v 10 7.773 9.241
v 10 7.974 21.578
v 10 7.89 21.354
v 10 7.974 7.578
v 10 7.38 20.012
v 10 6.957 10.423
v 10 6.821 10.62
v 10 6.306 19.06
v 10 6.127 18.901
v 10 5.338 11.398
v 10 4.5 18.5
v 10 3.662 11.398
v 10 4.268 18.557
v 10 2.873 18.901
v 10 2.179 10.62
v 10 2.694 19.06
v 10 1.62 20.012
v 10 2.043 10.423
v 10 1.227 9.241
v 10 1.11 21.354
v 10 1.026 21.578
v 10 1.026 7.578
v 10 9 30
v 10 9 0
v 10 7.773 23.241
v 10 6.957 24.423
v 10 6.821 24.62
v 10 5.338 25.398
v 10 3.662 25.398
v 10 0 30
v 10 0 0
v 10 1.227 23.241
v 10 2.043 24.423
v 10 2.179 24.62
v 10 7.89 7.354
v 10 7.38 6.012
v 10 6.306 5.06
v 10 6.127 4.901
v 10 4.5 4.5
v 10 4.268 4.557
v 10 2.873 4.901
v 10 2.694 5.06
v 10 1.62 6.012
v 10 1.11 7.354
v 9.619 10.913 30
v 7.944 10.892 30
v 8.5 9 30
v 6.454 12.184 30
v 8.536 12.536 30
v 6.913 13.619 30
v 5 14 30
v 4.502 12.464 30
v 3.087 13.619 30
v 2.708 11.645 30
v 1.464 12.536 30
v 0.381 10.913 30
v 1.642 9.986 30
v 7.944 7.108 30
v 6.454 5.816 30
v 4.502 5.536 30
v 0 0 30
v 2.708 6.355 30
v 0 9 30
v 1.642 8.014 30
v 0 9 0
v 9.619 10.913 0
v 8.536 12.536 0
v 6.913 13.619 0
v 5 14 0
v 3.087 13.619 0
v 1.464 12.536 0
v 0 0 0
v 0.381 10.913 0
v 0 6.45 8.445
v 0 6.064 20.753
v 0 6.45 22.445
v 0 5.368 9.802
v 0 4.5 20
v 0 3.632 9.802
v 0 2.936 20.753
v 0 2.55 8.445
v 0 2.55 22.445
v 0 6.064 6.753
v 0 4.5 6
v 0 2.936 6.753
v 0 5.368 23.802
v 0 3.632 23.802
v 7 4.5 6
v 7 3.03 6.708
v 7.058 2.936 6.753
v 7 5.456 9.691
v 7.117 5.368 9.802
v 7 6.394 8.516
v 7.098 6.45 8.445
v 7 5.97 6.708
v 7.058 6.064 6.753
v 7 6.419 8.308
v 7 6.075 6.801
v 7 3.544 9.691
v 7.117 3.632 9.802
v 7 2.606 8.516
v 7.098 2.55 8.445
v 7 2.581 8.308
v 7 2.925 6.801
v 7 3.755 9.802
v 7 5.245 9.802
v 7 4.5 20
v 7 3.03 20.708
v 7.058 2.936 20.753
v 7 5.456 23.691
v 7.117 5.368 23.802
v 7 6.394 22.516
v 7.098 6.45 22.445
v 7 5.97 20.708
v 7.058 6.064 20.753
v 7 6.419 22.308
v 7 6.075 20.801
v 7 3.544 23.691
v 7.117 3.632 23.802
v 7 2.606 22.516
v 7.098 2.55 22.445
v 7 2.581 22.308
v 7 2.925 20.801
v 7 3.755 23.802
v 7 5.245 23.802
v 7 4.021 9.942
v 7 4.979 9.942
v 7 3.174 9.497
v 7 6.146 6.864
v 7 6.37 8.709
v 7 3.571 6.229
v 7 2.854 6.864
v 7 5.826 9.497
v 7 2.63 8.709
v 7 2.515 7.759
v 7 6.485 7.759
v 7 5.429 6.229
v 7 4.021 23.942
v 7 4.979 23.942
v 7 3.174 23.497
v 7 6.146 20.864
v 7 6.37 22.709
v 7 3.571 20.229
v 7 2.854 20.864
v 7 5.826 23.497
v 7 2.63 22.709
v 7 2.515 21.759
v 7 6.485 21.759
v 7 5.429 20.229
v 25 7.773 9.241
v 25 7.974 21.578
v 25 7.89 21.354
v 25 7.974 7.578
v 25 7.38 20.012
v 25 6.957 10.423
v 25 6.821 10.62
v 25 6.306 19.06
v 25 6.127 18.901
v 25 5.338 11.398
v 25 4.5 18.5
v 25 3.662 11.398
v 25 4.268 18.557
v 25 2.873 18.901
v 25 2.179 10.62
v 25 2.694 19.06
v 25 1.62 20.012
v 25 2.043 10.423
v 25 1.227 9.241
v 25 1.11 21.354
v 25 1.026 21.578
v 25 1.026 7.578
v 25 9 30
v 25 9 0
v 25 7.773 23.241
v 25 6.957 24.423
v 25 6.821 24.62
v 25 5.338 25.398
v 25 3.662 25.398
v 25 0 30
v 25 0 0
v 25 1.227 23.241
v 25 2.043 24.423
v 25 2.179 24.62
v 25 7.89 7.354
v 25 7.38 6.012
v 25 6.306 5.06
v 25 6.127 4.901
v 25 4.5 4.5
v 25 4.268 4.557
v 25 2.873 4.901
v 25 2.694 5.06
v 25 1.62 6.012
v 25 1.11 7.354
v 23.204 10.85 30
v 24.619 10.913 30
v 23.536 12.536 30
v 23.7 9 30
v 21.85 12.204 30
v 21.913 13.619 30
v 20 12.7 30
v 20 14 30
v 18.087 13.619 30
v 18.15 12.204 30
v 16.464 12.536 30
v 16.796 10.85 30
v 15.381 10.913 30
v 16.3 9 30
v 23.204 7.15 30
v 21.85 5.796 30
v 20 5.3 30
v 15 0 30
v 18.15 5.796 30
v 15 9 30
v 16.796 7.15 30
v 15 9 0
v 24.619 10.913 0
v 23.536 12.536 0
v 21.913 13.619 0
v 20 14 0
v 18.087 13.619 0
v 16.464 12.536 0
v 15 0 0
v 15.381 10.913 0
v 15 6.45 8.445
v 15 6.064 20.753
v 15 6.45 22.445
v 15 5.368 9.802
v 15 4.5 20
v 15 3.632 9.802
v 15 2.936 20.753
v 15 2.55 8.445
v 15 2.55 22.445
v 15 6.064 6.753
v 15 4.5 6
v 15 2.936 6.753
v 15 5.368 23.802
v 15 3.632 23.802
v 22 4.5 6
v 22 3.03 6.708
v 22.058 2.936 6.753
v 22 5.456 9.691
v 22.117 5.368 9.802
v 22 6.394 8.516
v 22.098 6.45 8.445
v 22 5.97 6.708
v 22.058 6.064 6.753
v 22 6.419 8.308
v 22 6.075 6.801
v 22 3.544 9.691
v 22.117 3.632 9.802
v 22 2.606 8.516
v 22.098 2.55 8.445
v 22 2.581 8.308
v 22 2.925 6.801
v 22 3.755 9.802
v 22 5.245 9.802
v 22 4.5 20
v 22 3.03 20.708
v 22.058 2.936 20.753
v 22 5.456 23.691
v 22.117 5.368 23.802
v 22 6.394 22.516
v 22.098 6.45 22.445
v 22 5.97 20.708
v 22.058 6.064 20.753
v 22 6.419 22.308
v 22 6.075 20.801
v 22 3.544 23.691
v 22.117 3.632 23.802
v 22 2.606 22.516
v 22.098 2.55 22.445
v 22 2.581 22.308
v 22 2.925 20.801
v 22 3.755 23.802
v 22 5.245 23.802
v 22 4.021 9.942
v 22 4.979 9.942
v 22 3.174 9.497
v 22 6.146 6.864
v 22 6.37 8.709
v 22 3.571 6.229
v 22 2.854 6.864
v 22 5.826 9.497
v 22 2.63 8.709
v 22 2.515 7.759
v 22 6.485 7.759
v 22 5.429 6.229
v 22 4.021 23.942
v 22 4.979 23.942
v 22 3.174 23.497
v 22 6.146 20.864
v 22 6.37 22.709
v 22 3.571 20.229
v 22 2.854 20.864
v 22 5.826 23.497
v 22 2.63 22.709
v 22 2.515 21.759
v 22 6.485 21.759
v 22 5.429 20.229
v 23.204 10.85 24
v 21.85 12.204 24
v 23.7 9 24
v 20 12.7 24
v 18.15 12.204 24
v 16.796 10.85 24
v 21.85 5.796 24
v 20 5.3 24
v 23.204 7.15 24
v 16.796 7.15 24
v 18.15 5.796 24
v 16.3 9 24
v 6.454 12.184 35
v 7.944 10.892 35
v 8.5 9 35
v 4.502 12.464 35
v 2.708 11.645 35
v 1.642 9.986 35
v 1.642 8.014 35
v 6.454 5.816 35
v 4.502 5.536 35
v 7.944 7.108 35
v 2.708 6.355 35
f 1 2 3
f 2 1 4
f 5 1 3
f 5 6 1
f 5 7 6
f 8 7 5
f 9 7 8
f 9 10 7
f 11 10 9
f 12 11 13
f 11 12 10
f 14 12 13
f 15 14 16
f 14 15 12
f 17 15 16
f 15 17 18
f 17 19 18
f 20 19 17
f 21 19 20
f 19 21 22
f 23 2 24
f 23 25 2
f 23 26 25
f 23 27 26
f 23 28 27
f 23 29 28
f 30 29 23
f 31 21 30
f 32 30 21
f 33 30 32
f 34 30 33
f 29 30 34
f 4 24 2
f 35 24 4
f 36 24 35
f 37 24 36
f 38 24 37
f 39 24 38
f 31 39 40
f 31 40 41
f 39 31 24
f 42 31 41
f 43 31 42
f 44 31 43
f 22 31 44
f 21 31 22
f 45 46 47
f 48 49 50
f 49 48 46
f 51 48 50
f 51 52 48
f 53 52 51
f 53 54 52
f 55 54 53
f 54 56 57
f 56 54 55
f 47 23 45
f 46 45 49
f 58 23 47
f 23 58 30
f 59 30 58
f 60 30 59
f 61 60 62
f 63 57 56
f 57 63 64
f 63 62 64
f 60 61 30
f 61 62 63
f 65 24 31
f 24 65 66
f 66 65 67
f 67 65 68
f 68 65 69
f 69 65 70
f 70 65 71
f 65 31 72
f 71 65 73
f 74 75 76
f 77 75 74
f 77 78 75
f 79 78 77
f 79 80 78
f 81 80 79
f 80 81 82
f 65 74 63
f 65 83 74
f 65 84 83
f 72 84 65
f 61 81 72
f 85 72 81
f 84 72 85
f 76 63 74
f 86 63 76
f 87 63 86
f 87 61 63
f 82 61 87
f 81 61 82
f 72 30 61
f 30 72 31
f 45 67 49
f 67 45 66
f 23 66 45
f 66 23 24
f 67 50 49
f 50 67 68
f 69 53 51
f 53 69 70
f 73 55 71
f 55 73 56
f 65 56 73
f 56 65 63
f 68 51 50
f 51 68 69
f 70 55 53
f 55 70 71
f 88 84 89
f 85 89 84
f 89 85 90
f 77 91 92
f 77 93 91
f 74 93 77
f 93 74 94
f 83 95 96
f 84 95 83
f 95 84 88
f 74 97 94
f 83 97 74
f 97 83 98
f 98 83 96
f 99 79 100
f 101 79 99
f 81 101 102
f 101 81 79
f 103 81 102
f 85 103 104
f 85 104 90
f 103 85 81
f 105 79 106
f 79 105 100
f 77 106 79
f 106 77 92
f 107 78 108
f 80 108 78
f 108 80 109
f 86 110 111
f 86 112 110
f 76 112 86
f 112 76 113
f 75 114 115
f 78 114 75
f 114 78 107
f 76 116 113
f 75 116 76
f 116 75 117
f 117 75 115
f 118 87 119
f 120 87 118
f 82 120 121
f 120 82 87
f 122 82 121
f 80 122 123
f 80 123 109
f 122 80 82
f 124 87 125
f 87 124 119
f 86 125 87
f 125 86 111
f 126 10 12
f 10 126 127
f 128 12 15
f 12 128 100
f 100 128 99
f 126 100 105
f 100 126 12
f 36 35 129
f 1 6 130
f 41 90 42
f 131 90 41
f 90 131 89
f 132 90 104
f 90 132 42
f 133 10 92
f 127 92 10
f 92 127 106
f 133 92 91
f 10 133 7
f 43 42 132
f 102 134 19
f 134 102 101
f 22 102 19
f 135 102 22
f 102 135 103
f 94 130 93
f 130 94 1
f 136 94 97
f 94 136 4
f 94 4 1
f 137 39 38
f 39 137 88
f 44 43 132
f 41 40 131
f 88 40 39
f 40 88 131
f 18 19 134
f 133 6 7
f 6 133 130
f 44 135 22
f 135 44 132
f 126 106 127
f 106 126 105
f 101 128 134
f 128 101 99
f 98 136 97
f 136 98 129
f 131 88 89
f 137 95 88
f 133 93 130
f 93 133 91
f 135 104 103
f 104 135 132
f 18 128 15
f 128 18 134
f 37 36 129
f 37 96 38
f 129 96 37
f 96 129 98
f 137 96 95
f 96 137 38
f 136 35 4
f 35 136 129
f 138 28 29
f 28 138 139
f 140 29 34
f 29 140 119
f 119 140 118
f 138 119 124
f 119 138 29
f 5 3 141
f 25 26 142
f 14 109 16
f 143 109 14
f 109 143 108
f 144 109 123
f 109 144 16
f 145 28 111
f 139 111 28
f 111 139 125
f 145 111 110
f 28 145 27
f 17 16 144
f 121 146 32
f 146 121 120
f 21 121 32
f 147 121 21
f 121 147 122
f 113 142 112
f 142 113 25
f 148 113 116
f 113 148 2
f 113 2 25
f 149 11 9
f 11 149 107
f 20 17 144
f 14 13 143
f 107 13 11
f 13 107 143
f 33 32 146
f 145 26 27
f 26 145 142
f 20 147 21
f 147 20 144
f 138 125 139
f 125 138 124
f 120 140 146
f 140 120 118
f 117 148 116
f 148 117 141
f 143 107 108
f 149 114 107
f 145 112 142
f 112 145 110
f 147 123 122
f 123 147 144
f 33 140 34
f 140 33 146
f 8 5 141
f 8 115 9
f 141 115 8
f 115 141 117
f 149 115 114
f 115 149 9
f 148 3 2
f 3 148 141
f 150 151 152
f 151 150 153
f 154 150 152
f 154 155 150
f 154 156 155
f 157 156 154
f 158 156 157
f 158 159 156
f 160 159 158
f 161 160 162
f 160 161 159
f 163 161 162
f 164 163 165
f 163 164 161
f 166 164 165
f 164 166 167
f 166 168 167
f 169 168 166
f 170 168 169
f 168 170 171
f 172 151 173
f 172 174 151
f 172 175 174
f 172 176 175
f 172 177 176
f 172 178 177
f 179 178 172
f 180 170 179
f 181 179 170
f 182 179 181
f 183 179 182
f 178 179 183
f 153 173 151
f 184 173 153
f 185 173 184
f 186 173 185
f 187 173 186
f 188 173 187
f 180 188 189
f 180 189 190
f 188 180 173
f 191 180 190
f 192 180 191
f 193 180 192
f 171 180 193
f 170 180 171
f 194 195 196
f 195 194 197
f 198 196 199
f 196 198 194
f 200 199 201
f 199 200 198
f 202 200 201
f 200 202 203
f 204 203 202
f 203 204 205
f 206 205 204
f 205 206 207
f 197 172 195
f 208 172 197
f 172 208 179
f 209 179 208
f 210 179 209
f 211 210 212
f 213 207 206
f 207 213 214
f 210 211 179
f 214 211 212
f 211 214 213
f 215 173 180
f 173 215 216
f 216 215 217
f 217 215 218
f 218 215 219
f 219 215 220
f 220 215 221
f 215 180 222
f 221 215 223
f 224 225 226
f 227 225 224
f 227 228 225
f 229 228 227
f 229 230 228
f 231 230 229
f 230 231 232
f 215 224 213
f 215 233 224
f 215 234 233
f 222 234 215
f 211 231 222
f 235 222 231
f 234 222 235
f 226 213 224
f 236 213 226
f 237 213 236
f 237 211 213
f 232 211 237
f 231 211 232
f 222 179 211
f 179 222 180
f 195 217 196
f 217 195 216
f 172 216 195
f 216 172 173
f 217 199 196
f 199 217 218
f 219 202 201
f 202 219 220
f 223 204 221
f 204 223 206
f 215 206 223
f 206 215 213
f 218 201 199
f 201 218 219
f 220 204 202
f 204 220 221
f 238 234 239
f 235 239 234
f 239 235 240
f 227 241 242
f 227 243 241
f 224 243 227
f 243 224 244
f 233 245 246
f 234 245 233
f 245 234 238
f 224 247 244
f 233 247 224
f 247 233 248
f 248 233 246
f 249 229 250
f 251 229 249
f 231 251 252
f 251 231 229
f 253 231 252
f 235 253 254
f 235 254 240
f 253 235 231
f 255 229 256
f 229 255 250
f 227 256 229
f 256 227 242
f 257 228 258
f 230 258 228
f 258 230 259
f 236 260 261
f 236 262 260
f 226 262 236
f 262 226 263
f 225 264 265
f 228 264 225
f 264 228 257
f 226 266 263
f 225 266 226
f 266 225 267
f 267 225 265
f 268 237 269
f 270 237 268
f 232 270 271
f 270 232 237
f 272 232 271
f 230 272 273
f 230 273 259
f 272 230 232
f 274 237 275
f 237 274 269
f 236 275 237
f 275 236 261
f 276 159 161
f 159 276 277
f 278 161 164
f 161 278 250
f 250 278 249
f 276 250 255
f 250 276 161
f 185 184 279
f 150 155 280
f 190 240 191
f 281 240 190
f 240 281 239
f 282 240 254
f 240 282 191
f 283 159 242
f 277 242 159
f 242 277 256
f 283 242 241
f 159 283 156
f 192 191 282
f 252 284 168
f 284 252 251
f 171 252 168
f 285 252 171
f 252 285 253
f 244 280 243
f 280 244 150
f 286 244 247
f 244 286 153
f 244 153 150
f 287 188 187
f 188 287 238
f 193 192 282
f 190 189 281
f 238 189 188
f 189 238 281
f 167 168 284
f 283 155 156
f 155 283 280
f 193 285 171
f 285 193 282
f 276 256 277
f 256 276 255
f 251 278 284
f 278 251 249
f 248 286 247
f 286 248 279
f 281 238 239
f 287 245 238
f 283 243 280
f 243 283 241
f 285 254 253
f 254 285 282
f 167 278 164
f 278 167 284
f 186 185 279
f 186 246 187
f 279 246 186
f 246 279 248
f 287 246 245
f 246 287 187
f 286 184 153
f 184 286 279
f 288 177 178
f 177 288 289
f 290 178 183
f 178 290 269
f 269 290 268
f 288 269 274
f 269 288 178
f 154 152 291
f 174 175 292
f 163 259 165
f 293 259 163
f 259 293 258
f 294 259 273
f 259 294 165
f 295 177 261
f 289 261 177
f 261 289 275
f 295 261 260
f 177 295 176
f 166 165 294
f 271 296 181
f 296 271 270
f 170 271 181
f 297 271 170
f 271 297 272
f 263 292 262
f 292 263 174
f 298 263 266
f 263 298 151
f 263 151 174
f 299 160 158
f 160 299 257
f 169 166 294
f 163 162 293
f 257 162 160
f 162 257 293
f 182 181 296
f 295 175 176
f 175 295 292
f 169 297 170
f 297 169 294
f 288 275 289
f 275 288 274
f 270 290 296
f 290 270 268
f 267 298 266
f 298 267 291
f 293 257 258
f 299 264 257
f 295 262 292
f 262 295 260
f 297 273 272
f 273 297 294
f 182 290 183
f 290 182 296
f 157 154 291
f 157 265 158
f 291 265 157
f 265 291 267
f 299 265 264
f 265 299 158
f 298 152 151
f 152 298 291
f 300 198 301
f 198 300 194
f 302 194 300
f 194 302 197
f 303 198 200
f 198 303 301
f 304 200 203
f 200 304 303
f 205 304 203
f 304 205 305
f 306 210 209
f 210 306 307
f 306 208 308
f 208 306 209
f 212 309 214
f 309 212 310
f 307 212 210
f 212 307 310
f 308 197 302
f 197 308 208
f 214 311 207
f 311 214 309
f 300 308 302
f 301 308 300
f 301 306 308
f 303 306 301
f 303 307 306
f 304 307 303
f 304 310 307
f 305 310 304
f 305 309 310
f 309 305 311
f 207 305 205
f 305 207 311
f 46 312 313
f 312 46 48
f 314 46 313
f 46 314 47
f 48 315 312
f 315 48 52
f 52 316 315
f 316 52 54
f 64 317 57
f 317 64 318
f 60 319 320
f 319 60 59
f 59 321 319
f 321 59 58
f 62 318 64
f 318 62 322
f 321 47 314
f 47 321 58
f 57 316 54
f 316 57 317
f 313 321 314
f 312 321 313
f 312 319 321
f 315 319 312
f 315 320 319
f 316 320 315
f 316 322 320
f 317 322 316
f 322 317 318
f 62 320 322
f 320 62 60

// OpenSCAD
wood_thickness = 9;  // base for sizes is the wood thickness

hinge_depth = 30;  // actually the length of the body
hinge_height = wood_thickness * 1.0;  // * 1.0 for just folding or * 1.5 for folding over 
hinge_width = 10;  // thickness
penis_dia = 7;
penis_length = 5;
penis_clearance = 0.4;  // Try this out, see if it fits. 

hole_from_side = 8;
hole_from_bottom = wood_thickness / 2;
hole_dia = 4;
hole_dia_outer = 8;
hole_distance_to_outer = 3;  // distance from outer to narrow part

left_or_right = 1;  // 0 for tapped hole on one side, 1 for other side

module hinge_body() {
	cube([hinge_width, hinge_height, hinge_depth]);

	translate([hinge_width/2,hinge_height,0])
	cylinder(hinge_depth, hinge_width/2, hinge_width/2, [0,0,0]);
}

module hinge_body_holes() {
	difference() {
	   	hinge_body();
		translate([-1, hole_from_bottom, hole_from_side])
			rotate([0,90,0])
				cylinder(hinge_width+2, hole_dia/2, hole_dia/2);
		translate([-1, hole_from_bottom, hinge_depth-hole_from_side])
			rotate([0,90,0])
				cylinder(hinge_width+2, hole_dia/2, hole_dia/2);
	}
}

module hinge_body_tapped_holes1() {
	difference() {
		hinge_body_holes();
		translate([-1, hole_from_bottom, hole_from_side])
			rotate([0,90,0])
				cylinder(hole_distance_to_outer+1, hole_dia_outer/2, hole_dia/2);
		translate([-1, hole_from_bottom, hinge_depth-hole_from_side])
			rotate([0,90,0])
				cylinder(hole_distance_to_outer+1, hole_dia_outer/2, hole_dia/2);
	}
}

module hinge_body_tapped_holes2() {
	difference() {
		hinge_body_holes();
		translate([hinge_width-hole_distance_to_outer, hole_from_bottom, hole_from_side])
			rotate([0,90,0])
				cylinder(hole_distance_to_outer+1, hole_dia/2, hole_dia_outer/2);
		translate([hinge_width-hole_distance_to_outer, hole_from_bottom, hinge_depth-hole_from_side])
			rotate([0,90,0])
				cylinder(hole_distance_to_outer+1, hole_dia/2, hole_dia_outer/2);
	}
}

// male
if (left_or_right == 0) {
    hinge_body_tapped_holes1();
} else {
    hinge_body_tapped_holes2();
}
translate([hinge_width/2,hinge_height,hinge_depth-1])
cylinder(penis_length+1, penis_dia/2, penis_dia/2, [0,0,0]);

// female
translate([1.5*hinge_width,0,0]) {
	difference() {
		if (left_or_right == 0) {
    			hinge_body_tapped_holes1();
		} else {
    			hinge_body_tapped_holes2();
		}
		translate([hinge_width/2,hinge_height,hinge_depth-penis_length-1])
			cylinder(penis_length+2, (penis_dia+penis_clearance)/2, (penis_dia+penis_clearance)/2, [0,0,0]);
	}
}
